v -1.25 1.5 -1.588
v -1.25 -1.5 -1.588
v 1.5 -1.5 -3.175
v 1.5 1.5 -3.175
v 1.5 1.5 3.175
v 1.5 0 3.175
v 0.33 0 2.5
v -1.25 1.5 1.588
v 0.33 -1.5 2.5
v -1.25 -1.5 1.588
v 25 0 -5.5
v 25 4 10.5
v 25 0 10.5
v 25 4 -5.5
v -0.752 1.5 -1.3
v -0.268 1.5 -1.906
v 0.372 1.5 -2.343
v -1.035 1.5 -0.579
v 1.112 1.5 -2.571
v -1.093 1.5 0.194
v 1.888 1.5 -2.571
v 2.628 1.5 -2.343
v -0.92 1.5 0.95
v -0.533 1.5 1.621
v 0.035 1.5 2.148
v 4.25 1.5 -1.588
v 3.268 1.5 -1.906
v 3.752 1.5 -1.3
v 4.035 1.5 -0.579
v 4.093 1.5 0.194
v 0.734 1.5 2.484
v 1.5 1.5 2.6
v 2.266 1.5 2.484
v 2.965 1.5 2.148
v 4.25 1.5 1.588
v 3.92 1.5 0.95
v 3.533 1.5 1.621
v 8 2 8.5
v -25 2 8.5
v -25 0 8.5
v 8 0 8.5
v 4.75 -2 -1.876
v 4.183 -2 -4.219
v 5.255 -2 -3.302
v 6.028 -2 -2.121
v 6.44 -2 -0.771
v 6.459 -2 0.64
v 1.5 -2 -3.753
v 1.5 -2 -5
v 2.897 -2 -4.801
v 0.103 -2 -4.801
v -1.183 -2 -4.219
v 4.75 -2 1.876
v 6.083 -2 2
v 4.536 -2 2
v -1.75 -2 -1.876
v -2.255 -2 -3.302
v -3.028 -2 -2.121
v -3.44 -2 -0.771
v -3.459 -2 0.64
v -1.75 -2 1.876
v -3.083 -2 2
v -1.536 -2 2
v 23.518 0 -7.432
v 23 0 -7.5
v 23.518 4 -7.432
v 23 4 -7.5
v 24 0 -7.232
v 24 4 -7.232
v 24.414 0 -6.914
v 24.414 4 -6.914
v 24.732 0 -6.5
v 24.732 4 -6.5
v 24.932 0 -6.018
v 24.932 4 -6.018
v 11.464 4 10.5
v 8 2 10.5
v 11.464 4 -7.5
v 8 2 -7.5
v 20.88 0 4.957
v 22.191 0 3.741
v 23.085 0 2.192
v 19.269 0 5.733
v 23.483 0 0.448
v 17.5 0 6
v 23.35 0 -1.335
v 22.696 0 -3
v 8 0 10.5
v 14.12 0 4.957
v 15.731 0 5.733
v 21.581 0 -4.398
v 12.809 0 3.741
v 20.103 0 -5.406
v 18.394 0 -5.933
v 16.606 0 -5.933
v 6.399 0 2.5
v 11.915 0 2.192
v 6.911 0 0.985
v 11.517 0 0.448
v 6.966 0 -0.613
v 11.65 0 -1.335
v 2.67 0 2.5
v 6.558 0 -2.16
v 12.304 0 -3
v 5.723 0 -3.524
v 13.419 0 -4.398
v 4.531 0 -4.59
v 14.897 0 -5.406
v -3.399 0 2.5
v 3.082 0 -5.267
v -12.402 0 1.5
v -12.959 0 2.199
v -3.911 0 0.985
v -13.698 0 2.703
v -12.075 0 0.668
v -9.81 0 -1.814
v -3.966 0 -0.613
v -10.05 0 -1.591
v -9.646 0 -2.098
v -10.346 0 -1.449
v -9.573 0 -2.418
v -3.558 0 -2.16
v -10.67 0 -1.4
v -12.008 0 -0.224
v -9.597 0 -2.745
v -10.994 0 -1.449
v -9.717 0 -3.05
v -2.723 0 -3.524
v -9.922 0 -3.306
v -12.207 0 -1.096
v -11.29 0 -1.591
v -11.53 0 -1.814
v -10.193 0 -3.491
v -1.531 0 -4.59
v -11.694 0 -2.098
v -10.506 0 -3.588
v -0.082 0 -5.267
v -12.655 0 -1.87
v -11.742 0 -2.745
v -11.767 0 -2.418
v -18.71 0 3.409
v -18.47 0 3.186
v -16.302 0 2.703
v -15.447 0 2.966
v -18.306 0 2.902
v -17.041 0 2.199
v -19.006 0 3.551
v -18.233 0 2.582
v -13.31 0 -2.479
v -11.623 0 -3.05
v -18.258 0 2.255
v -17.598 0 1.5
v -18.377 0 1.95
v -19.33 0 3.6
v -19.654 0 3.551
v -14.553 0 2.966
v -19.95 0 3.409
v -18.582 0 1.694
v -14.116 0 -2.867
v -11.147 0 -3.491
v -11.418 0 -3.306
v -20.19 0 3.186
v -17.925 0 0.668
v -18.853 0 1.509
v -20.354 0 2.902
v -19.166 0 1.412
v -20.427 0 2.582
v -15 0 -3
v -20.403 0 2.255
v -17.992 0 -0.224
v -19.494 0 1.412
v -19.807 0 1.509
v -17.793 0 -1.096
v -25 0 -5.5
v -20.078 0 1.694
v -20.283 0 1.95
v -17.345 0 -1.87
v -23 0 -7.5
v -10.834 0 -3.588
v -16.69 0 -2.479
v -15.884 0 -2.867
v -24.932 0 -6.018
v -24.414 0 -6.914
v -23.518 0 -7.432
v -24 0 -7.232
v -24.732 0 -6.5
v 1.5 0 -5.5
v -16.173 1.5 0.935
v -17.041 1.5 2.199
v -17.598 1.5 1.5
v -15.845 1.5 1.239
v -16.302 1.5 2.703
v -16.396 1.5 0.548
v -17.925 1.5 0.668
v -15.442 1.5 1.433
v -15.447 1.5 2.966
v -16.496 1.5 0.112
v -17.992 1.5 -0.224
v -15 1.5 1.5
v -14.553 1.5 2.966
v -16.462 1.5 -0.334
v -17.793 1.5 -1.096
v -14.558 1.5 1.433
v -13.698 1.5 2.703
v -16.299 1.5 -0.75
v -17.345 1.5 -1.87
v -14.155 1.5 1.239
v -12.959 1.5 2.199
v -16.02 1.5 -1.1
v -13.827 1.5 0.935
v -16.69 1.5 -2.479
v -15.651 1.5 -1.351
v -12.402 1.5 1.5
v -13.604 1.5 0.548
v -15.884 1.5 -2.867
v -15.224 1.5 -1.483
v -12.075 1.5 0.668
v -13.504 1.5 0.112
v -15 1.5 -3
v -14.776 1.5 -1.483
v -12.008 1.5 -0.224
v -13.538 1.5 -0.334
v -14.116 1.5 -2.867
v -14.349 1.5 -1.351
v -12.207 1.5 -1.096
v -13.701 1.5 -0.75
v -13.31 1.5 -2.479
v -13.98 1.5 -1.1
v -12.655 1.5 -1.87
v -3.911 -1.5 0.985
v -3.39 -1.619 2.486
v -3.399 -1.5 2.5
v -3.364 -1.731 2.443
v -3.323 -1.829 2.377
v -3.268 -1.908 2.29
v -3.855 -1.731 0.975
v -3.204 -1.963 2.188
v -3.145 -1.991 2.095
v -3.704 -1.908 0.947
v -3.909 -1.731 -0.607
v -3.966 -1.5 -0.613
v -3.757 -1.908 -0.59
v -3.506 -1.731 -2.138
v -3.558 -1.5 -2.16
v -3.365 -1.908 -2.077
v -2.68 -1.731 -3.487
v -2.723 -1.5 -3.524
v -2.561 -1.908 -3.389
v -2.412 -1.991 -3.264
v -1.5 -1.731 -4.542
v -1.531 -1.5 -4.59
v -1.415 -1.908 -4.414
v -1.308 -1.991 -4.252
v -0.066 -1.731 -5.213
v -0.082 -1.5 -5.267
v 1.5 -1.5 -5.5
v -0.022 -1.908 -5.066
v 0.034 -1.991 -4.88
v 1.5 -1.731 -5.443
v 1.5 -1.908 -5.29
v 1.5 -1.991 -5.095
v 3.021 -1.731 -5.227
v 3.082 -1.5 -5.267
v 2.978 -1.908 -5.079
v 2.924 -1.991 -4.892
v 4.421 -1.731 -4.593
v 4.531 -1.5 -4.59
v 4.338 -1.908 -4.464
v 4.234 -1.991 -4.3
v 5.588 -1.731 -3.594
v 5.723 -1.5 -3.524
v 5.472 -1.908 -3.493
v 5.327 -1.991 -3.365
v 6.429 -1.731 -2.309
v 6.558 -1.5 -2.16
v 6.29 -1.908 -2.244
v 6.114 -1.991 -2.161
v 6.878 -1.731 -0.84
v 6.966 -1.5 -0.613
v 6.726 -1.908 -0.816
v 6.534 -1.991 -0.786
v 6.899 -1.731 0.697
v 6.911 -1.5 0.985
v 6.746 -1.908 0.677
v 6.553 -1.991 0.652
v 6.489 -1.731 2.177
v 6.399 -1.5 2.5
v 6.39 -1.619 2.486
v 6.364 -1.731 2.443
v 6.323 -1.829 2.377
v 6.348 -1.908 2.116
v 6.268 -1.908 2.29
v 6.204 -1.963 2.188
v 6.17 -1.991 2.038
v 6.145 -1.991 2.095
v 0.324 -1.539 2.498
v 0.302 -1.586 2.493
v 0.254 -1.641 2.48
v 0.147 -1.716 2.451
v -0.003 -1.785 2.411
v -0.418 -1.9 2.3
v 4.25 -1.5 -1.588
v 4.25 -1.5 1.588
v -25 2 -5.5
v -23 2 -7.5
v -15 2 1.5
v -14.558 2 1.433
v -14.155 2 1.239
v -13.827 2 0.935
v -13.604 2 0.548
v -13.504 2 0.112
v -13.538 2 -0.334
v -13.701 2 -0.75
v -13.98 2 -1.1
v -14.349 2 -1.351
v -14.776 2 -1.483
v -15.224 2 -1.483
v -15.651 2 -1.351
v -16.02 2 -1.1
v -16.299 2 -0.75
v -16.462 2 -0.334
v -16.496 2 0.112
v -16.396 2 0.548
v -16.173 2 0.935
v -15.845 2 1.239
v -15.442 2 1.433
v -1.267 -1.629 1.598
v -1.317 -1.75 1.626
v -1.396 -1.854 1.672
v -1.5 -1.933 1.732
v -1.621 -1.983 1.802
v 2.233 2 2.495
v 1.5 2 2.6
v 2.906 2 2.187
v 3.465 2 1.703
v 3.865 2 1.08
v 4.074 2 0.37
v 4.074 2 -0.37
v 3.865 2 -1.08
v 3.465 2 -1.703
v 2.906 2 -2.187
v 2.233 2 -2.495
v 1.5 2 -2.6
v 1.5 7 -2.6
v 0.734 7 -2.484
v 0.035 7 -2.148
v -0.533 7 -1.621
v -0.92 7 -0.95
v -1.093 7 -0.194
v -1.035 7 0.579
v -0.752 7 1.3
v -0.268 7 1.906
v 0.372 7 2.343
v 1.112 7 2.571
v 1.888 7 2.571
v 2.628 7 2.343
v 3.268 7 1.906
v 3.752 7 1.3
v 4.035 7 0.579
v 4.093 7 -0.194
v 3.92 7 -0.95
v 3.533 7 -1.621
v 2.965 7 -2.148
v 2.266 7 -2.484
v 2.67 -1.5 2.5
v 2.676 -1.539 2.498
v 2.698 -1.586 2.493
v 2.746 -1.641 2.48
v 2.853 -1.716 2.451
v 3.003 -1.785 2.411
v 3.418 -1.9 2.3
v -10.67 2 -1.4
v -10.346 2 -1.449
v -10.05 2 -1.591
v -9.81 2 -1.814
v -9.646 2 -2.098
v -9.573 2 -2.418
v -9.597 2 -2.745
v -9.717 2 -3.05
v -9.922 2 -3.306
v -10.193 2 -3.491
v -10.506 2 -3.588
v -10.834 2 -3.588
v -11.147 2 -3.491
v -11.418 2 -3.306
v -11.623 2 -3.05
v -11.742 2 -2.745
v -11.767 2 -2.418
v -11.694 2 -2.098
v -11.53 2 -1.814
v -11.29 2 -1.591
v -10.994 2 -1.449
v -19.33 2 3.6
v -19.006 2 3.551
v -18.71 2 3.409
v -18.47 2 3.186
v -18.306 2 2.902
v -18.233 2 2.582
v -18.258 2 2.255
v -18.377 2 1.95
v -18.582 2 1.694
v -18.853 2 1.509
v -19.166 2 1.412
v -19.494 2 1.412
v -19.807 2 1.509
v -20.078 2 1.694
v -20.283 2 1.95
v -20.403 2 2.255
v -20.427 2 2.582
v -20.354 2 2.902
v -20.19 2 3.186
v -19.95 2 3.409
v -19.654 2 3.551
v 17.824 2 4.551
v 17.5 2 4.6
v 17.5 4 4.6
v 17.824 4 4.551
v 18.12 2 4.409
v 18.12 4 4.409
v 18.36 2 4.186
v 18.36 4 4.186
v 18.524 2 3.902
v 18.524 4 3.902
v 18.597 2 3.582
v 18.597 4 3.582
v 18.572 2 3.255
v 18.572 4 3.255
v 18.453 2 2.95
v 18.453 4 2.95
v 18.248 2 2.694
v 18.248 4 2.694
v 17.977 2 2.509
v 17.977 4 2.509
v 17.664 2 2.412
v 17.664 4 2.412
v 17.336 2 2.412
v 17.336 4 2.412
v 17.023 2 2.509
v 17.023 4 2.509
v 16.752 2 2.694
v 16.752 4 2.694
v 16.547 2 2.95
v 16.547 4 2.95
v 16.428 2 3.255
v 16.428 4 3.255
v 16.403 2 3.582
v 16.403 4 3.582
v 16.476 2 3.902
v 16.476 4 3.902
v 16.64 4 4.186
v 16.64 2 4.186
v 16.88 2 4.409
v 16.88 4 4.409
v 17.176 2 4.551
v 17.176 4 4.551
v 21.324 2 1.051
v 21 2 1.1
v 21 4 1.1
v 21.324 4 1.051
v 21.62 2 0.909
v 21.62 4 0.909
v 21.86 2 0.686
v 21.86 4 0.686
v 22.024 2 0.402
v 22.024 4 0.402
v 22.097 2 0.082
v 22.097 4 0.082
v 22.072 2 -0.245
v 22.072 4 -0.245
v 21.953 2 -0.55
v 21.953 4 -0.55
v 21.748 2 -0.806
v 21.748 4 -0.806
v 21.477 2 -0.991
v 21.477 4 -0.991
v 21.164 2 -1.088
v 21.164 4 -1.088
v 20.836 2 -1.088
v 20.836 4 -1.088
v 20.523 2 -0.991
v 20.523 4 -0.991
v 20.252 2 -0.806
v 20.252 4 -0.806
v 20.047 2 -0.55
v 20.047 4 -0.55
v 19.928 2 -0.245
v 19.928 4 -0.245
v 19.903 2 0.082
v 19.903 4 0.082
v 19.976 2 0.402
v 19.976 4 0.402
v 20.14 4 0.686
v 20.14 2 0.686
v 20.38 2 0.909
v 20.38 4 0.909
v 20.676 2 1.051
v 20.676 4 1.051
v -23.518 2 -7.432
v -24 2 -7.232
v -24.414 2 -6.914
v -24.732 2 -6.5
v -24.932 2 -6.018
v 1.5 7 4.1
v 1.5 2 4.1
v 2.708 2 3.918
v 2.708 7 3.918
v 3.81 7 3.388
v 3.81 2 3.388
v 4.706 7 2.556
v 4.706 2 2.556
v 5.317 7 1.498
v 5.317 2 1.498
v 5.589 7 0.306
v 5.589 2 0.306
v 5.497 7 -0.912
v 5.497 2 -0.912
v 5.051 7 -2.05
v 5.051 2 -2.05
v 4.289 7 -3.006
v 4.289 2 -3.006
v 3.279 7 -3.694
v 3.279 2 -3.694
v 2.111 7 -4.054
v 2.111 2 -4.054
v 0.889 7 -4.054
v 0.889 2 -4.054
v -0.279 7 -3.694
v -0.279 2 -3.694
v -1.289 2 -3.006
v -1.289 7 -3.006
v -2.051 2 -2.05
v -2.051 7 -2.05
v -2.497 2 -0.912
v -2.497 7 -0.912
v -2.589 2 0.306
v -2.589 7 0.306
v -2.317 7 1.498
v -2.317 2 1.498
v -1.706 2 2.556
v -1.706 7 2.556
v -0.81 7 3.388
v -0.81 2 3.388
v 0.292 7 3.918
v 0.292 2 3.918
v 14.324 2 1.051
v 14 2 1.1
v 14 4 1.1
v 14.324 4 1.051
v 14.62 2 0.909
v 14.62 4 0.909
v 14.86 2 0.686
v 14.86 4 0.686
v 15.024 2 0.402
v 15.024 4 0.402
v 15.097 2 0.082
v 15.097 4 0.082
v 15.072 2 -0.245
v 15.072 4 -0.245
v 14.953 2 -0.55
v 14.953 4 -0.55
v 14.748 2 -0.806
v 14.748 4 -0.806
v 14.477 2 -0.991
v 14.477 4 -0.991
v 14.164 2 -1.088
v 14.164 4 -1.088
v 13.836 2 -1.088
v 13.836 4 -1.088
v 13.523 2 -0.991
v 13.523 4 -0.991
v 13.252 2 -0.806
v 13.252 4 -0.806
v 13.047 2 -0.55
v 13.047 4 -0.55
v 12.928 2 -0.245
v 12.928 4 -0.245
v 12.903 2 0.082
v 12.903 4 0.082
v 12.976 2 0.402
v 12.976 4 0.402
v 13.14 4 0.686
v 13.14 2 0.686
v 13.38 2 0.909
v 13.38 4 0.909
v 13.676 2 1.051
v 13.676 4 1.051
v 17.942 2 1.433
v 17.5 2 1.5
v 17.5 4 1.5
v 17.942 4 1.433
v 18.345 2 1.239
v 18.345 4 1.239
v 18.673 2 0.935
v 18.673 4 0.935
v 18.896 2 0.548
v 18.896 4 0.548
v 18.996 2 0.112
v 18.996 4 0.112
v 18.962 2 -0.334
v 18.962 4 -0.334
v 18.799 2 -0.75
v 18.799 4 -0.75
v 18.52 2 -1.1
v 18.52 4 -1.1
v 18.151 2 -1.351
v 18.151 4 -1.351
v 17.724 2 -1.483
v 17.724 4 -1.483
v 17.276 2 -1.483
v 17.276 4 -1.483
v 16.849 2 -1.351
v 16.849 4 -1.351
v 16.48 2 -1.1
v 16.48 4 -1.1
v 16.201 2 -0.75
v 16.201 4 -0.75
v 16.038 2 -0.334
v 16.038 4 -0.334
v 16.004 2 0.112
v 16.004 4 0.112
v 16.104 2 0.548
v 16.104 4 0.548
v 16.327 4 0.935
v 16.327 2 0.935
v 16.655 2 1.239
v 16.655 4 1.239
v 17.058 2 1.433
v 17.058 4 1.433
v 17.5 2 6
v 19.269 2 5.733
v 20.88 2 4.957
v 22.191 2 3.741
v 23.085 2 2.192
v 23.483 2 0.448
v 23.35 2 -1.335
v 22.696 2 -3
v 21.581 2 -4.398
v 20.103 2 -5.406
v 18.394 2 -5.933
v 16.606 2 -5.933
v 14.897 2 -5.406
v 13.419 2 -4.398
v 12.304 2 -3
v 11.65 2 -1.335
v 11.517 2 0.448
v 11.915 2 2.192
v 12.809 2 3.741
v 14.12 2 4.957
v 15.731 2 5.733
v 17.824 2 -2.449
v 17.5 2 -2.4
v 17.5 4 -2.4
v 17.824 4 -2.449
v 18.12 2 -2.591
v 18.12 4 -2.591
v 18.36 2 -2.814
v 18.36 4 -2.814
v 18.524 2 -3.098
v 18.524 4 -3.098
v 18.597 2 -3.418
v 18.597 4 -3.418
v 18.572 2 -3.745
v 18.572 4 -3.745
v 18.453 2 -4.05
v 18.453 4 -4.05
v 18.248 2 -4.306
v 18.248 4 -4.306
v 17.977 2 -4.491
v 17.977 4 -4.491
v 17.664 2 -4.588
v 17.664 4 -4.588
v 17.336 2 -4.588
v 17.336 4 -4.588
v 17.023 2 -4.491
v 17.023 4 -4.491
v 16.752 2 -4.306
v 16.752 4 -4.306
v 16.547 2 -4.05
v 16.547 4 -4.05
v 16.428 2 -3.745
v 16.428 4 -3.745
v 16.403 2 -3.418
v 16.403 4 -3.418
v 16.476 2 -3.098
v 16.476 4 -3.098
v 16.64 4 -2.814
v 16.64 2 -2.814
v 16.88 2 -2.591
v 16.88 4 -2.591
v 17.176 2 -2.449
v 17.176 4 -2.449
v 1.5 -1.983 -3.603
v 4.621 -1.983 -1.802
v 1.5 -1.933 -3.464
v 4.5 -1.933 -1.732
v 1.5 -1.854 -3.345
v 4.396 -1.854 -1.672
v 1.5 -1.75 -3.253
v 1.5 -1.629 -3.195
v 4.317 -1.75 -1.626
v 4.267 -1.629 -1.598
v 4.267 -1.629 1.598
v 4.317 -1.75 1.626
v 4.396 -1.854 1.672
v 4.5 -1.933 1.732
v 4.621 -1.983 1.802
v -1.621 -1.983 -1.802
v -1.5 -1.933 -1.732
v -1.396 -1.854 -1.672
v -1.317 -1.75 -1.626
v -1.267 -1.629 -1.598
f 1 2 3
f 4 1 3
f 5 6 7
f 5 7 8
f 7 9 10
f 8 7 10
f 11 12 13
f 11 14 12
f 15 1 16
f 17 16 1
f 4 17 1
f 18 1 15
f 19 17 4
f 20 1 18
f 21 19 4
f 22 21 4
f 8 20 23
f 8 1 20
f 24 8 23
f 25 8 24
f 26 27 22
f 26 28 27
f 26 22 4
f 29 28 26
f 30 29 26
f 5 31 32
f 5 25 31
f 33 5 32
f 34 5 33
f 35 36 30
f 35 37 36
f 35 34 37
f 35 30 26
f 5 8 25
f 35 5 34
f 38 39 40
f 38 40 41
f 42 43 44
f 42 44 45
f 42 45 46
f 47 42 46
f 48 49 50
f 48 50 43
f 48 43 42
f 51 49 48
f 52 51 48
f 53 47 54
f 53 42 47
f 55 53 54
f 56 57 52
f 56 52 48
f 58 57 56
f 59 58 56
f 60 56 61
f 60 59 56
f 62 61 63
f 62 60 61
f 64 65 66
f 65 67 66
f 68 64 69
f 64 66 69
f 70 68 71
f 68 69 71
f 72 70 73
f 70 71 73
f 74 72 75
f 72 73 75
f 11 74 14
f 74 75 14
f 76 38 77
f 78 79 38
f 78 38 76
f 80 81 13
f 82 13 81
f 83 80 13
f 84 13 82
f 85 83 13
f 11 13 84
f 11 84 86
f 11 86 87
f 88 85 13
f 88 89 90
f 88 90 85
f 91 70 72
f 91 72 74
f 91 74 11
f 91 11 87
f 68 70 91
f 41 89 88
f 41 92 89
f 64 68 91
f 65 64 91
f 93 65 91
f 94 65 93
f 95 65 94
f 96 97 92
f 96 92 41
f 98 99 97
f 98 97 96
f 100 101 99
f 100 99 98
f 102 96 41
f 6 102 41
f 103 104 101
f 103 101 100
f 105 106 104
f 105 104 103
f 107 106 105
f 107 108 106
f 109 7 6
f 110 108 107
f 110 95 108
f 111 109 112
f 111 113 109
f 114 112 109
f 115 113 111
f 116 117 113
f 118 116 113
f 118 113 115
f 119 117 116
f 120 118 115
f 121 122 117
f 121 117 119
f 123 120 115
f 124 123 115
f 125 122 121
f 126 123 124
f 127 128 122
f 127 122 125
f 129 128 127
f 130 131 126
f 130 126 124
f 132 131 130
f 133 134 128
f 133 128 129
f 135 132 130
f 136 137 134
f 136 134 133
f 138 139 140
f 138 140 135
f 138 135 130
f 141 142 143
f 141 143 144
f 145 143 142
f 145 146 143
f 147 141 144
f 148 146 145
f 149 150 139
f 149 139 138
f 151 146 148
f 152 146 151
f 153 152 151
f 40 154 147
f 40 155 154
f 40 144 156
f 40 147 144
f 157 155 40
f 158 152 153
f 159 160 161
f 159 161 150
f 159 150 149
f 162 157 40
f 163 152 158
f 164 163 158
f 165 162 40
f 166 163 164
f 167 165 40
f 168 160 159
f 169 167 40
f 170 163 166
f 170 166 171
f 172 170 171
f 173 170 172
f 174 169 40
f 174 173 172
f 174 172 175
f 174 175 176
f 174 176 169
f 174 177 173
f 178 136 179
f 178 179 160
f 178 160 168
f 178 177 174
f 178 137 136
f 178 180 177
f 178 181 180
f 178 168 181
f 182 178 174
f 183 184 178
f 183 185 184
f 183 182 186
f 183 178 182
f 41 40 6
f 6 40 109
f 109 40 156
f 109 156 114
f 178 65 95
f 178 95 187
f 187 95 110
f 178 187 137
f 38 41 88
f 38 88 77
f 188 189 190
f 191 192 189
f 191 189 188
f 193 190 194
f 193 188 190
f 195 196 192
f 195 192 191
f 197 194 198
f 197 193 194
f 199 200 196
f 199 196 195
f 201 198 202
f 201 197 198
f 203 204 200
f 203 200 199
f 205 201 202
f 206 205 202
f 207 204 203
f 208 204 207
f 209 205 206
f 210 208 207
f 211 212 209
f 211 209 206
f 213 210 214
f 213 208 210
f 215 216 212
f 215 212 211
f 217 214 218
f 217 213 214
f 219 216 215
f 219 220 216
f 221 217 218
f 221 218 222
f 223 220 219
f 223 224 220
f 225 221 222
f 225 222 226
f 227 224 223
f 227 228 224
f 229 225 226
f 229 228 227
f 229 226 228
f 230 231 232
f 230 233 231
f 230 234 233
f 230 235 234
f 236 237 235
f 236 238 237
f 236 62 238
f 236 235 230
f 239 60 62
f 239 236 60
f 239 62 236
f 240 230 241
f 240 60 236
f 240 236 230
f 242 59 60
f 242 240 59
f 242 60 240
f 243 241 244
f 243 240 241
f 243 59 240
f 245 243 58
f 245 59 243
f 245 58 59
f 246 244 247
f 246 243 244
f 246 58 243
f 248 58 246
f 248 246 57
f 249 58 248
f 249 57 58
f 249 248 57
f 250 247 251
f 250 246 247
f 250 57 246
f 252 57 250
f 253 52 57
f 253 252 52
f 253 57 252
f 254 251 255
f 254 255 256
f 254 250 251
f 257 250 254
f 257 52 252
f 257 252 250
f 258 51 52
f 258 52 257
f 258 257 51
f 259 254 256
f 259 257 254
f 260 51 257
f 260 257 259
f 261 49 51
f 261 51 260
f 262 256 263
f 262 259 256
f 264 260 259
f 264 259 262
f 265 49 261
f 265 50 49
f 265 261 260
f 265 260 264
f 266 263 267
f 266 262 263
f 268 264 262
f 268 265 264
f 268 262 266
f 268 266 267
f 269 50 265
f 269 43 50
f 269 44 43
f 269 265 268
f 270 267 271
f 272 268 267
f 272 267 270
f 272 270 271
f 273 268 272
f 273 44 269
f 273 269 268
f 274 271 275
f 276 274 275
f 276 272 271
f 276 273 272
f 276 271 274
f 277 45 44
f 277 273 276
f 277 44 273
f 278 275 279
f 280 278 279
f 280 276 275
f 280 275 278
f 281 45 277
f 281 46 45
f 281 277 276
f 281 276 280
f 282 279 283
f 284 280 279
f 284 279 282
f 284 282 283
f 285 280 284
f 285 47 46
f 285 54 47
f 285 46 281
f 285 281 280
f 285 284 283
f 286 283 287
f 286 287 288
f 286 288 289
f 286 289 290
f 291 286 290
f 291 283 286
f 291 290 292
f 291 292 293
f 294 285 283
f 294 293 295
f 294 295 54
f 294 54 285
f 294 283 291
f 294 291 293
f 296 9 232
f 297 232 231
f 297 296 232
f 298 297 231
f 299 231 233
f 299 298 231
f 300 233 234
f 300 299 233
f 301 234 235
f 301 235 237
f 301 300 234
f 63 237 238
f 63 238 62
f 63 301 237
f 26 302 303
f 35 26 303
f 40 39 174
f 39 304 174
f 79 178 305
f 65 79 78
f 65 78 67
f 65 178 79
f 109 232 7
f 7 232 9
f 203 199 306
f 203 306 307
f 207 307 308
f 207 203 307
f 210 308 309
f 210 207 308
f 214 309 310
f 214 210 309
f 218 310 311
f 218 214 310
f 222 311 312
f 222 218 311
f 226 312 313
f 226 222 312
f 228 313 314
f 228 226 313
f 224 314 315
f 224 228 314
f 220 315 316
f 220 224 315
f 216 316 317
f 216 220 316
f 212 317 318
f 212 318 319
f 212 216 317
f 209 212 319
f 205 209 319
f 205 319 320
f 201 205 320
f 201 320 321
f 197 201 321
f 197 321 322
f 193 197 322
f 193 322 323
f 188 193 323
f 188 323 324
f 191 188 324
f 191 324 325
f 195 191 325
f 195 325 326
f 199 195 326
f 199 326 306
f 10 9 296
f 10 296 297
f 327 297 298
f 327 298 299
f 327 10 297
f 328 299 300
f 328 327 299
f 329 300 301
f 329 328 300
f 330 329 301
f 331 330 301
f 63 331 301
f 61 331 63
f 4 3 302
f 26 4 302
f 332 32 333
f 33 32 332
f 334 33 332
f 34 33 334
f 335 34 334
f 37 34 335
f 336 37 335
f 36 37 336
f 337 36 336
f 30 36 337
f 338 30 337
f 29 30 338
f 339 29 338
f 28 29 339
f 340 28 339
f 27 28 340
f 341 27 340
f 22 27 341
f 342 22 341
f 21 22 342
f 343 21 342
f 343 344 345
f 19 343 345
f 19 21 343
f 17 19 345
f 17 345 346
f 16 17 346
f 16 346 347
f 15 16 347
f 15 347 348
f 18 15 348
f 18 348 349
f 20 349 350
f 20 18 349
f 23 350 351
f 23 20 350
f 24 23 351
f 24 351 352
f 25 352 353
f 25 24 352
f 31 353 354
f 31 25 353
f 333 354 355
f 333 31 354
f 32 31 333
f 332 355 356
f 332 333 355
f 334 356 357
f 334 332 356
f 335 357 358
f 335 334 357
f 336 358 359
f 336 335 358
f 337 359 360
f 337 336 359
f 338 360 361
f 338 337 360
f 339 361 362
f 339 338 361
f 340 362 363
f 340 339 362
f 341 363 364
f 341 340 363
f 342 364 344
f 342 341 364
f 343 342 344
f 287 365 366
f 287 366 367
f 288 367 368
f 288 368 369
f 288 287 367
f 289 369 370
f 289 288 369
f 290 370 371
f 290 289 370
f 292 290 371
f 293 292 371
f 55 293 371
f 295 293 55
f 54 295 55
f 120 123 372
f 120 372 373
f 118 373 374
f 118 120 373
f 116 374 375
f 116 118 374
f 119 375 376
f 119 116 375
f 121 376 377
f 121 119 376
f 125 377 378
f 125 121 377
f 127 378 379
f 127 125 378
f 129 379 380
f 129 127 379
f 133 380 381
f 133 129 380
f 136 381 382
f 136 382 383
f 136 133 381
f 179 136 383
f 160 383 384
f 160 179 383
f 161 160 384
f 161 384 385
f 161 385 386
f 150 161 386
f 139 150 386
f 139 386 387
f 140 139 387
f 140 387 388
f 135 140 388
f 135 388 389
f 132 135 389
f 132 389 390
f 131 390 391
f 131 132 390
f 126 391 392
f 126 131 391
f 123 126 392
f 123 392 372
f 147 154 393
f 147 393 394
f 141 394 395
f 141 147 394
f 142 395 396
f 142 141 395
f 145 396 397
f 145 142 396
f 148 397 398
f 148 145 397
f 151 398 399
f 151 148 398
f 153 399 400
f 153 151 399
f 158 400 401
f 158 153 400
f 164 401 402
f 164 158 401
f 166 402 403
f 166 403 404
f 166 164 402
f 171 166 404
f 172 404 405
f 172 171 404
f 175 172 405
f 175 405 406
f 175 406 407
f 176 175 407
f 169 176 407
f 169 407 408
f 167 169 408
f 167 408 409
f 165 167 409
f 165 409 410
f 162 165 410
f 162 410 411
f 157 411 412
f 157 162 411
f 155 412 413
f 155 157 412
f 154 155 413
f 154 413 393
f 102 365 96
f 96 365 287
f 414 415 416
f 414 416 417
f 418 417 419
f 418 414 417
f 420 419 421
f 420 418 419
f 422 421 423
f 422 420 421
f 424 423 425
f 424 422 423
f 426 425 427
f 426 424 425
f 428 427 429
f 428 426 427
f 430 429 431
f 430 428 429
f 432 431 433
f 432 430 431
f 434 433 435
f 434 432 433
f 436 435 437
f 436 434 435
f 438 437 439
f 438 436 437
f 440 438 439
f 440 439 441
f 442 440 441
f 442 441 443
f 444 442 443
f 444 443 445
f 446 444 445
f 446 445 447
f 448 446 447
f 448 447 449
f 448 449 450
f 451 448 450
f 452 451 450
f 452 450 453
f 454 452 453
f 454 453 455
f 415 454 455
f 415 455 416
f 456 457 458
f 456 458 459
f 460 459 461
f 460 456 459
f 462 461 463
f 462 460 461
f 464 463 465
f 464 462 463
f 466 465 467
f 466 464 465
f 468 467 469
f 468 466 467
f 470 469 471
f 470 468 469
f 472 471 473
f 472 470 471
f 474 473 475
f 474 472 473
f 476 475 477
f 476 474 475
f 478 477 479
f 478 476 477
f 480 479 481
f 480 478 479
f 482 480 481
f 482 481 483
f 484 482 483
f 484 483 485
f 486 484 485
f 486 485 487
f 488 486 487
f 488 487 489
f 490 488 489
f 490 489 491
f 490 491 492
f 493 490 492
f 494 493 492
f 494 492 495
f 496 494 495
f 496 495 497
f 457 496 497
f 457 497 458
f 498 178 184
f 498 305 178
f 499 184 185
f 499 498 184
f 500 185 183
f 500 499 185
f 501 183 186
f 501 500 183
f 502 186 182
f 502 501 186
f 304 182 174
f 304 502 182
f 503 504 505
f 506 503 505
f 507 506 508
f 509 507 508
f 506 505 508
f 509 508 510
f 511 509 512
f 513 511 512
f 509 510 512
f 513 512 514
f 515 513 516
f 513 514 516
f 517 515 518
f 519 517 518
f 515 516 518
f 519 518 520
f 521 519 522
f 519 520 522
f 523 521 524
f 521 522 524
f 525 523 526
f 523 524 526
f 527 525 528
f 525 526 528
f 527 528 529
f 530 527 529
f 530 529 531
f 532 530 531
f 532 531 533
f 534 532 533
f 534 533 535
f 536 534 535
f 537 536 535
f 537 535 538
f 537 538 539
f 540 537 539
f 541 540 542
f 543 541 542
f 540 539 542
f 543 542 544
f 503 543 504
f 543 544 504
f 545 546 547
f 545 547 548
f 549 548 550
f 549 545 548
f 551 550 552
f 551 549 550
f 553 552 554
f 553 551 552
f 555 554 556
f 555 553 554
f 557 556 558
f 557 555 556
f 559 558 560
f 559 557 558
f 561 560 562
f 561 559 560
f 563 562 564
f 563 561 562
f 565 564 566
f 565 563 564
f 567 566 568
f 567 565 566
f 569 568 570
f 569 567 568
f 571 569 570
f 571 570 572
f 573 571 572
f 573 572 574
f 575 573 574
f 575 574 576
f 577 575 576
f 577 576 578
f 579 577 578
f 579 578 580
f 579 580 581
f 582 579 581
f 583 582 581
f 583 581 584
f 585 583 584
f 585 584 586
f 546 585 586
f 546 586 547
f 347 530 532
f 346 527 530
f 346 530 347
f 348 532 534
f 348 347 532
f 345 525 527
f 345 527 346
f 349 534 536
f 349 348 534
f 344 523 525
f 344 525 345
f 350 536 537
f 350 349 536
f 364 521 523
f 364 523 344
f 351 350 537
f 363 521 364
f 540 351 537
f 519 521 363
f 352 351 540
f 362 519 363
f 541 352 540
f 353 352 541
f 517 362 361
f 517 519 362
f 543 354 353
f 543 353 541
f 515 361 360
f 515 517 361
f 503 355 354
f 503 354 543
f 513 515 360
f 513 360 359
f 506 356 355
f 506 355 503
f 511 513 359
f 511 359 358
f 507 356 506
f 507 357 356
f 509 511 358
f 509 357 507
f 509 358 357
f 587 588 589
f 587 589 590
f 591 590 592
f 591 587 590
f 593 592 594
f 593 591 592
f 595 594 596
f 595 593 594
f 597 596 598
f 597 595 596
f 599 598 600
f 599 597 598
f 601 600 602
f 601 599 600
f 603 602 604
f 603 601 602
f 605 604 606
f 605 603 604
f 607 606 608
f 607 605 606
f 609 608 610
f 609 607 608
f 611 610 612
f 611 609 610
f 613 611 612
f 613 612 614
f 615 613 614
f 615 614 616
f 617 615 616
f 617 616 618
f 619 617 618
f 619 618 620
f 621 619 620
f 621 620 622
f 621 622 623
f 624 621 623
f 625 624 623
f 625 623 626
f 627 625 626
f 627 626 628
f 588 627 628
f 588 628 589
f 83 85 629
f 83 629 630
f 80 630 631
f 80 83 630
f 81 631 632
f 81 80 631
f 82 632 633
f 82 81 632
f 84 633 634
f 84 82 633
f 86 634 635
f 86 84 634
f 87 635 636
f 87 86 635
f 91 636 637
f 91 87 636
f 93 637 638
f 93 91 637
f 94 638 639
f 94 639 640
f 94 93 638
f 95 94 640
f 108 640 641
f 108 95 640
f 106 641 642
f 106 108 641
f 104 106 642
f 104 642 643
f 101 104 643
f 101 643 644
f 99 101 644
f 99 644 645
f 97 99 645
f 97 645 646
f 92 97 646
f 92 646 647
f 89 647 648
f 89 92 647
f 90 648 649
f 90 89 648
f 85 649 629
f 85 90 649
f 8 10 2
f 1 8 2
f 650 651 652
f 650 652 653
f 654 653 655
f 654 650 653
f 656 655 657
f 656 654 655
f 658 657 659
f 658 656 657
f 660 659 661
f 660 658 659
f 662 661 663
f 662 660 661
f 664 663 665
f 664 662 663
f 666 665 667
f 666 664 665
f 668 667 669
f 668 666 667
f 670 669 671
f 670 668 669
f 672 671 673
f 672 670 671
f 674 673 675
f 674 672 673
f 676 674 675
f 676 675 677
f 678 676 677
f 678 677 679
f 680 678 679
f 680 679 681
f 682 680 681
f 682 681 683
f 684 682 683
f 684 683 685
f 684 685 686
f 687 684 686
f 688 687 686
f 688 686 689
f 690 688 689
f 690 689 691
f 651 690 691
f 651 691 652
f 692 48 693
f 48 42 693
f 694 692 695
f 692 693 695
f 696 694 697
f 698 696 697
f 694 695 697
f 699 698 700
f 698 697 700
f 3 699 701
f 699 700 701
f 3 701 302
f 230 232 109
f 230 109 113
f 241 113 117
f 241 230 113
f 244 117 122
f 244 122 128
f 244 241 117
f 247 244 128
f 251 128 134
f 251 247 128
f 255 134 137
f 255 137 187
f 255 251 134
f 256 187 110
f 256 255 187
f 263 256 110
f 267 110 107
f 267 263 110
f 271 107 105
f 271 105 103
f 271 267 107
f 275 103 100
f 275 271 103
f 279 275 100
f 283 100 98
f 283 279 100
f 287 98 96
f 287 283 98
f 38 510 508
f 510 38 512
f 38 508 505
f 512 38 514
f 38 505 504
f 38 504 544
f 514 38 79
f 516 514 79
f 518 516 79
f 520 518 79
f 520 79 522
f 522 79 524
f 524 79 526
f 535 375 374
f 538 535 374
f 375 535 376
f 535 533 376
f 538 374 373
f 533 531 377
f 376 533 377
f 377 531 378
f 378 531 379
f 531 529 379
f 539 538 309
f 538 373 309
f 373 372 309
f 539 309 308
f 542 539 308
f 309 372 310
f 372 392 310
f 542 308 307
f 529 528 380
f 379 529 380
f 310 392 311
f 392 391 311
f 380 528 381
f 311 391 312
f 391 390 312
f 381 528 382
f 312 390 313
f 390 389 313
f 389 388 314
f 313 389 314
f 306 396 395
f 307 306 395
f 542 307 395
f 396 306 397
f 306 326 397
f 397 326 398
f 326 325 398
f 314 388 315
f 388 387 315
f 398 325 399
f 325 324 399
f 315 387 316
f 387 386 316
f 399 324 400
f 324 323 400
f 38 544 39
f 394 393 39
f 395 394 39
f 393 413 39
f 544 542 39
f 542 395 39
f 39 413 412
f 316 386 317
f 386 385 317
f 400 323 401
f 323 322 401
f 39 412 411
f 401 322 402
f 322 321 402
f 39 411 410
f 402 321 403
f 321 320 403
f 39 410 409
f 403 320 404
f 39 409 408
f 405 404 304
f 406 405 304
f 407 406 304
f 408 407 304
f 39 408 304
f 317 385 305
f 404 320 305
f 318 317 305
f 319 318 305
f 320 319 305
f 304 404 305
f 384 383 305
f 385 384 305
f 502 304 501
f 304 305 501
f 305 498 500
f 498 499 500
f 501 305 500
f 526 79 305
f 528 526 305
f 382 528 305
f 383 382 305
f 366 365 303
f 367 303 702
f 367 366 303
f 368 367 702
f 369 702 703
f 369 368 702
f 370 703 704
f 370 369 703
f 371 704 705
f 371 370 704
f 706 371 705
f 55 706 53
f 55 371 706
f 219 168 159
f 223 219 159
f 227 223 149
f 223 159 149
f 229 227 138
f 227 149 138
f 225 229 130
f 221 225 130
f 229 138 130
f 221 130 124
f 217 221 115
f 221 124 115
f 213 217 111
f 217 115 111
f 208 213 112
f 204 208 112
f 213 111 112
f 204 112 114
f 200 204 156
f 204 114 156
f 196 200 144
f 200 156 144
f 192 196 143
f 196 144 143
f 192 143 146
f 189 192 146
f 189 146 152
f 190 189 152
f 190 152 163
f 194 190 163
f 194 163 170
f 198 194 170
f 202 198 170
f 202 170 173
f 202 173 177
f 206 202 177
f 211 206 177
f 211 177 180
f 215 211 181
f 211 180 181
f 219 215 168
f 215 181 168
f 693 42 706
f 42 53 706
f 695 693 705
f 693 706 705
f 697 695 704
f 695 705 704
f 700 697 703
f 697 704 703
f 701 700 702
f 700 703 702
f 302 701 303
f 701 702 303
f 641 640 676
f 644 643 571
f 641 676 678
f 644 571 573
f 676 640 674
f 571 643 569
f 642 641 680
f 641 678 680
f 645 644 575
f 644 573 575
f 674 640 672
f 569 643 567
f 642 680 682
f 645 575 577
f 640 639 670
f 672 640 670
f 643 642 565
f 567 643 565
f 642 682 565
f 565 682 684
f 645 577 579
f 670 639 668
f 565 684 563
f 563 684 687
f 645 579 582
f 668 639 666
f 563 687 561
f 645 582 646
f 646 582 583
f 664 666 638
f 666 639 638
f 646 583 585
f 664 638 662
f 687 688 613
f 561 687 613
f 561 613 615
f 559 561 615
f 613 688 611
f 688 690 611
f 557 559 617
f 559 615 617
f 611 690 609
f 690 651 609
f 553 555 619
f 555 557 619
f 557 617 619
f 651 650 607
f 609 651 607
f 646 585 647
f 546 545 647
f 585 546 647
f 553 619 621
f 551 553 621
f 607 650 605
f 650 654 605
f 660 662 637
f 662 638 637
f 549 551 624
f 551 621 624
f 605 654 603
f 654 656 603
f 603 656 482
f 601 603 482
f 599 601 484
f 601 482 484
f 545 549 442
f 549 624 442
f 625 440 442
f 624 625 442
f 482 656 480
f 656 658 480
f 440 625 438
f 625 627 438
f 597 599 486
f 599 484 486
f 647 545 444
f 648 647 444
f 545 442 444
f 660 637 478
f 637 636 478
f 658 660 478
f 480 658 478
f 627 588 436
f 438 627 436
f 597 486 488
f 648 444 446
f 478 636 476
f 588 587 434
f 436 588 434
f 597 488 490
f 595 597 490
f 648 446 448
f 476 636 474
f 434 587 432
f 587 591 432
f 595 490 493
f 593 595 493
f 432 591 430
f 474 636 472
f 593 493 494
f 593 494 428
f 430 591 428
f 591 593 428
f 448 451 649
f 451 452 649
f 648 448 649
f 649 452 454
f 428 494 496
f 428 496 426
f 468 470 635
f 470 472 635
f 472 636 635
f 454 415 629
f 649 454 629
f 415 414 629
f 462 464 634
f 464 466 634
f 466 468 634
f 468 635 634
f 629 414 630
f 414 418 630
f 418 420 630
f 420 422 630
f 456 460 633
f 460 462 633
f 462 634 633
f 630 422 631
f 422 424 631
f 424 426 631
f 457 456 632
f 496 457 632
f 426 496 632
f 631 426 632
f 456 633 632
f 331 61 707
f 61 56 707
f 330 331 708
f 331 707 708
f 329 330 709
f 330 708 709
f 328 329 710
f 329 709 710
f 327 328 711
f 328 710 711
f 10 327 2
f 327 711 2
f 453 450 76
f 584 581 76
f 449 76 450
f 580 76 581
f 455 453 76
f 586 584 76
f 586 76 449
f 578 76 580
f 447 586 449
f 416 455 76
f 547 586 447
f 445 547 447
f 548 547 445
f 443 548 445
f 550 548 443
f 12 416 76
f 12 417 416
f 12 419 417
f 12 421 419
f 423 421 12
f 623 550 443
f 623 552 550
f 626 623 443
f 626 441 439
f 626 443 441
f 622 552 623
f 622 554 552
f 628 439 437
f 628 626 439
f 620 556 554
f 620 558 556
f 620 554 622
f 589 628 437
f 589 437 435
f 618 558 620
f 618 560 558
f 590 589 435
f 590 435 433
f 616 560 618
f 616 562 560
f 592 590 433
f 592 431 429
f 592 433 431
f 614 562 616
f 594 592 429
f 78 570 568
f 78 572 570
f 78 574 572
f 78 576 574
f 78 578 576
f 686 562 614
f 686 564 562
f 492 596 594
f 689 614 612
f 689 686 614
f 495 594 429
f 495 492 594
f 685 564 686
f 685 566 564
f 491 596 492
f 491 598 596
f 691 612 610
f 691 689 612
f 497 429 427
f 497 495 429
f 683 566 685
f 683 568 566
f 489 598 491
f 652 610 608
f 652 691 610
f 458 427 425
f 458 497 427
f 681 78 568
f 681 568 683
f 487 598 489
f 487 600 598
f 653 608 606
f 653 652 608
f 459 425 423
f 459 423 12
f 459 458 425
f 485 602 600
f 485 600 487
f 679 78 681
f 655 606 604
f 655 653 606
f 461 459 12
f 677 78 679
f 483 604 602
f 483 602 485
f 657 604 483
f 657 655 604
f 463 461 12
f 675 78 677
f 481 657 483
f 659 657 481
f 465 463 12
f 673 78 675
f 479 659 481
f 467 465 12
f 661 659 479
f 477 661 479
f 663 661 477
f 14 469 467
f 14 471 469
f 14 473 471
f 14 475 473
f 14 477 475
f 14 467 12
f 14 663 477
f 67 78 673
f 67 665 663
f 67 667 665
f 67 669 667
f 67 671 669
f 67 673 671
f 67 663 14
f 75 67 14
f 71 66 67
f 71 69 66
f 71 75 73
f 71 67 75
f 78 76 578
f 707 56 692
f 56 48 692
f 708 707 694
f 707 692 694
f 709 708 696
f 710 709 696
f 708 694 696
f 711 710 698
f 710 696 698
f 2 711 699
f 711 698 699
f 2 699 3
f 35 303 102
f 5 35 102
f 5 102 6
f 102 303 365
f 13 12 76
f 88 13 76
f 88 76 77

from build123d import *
from build123d.topology import SkipClean

# Parameters (mm, degrees)
SKETCH_1_W          = 50
SKETCH_1_H          = 15
SKETCH_1_R          = 1.1
SKETCH_1_R_2        = 1.5
SKETCH_1_R_3        = 2.6
EXTRUDE_1_DEPTH     = 2
SKETCH_3_R          = 3
CUT_EXTRUDE_1_DEPTH = 1.5
SKETCH_1_7_W        = 17
SKETCH_1_7_H        = 15
SKETCH_1_7_R        = 1.5
SKETCH_1_7_R_2      = 1.1
EXTRUDE_4_DEPTH     = 4
SKETCH_1_8_R        = 6
SKETCH_1_8_R_2      = 1.5
SKETCH_1_8_R_3      = 1.1
CUT_EXTRUDE_4_DEPTH = 2
CUT_EXTRUDE_5_DEPTH = 15
EXTRUDE_START       = 2
SKETCH_8_R          = 5.5
SKETCH_8_R_2        = 2.6
EXTRUDE_11_DEPTH    = 2
CUT_EXTRUDE_6_DEPTH = 3.5
CUT_EXTRUDE_7_DEPTH = 2
FILLET_1_R          = 2
EXTRUDE_15_DEPTH    = 1
EXTRUDE_16_DEPTH    = 2
SKETCH_16_R         = 4.1
SKETCH_16_R_2       = 2.6
EXTRUDE_18_DEPTH    = 5
FILLET_3_R          = 0.5


with BuildPart() as part:
    # 草图1 → 凸台-拉伸1 (new body)
    with BuildSketch(Plane(origin=(0, 0, 0), x_dir=(1, 0, 0), z_dir=(0, 1, 0))):
        Rectangle(SKETCH_1_W, SKETCH_1_H)
        with BuildLine():
            ThreePointArc((8, 2.598076211), (8.5, 0), (8, -2.598076211))
            Line((8, -2.598076211), (8, 2.598076211))
        make_face(mode=Mode.SUBTRACT)
        with Locations(Location((-19.330127019, -2.5, 0), (0, 0, 270))):
            Circle(SKETCH_1_R, mode=Mode.SUBTRACT)
        with Locations(Location((-15, 0, 0), (0, 0, 270))):
            Circle(SKETCH_1_R_2, mode=Mode.SUBTRACT)
        with Locations(Location((-10.669872981, 2.5, 0), (0, 0, 270))):
            Circle(SKETCH_1_R, mode=Mode.SUBTRACT)
        with Locations(Location((1.5, 0, 0), (0, 0, 270))):
            Circle(SKETCH_1_R_3, mode=Mode.SUBTRACT)
        with Locations(Location((17.5, 3.5, 0), (0, 0, 270))):
            Circle(SKETCH_1_R, mode=Mode.SUBTRACT)
        with Locations(Location((17.5, -3.5, 0), (0, 0, 270))):
            Circle(SKETCH_1_R, mode=Mode.SUBTRACT)
        with Locations(Location((14, 0, 0), (0, 0, 270))):
            Circle(SKETCH_1_R, mode=Mode.SUBTRACT)
        with Locations(Location((17.5, 0, 0), (0, 0, 270))):
            Circle(SKETCH_1_R_2, mode=Mode.SUBTRACT)
        with Locations(Location((21, 0, 0), (0, 0, 270))):
            Circle(SKETCH_1_R, mode=Mode.SUBTRACT)
    extrude(amount=EXTRUDE_1_DEPTH)

    # 草图3 → 切除-拉伸1 (cut)
    with BuildSketch(Plane.XZ):
        with Locations(Location((-15, 0, 0), (0, 0, 270))):
            Circle(SKETCH_3_R)
    extrude(amount=-CUT_EXTRUDE_1_DEPTH, mode=Mode.SUBTRACT)

    # 草图1<7> → 凸台-拉伸4 (add)
    with BuildSketch(Plane(origin=(0, 0, 0), x_dir=(1, 0, 0), z_dir=(0, 1, 0))):
        with Locations((16.5, 0)):
            Rectangle(SKETCH_1_7_W, SKETCH_1_7_H)
        with Locations(Location((17.5, 0, 0), (0, 0, 270))):
            Circle(SKETCH_1_7_R, mode=Mode.SUBTRACT)
        with Locations(Location((21, 0, 0), (0, 0, 270))):
            Circle(SKETCH_1_7_R_2, mode=Mode.SUBTRACT)
        with Locations(Location((17.5, -3.5, 0), (0, 0, 270))):
            Circle(SKETCH_1_7_R_2, mode=Mode.SUBTRACT)
        with Locations(Location((14, 0, 0), (0, 0, 270))):
            Circle(SKETCH_1_7_R_2, mode=Mode.SUBTRACT)
        with Locations(Location((17.5, 3.5, 0), (0, 0, 270))):
            Circle(SKETCH_1_7_R_2, mode=Mode.SUBTRACT)
    extrude(amount=EXTRUDE_4_DEPTH)

    # 草图1<8> → 切除-拉伸4 (cut)
    with BuildSketch(Plane(origin=(0, 0, 0), x_dir=(1, 0, 0), z_dir=(0, 1, 0))):
        with Locations(Location((17.5, 0, 0), (0, 0, 270))):
            Circle(SKETCH_1_8_R)
        with Locations(Location((17.5, 0, 0), (0, 0, 270))):
            Circle(SKETCH_1_8_R_2, mode=Mode.SUBTRACT)
        with Locations(Location((21, 0, 0), (0, 0, 270))):
            Circle(SKETCH_1_8_R_3, mode=Mode.SUBTRACT)
        with Locations(Location((17.5, -3.5, 0), (0, 0, 270))):
            Circle(SKETCH_1_8_R_3, mode=Mode.SUBTRACT)
        with Locations(Location((14, 0, 0), (0, 0, 270))):
            Circle(SKETCH_1_8_R_3, mode=Mode.SUBTRACT)
        with Locations(Location((17.5, 3.5, 0), (0, 0, 270))):
            Circle(SKETCH_1_8_R_3, mode=Mode.SUBTRACT)
    extrude(amount=CUT_EXTRUDE_4_DEPTH, mode=Mode.SUBTRACT)

    # 草图6 → 切除-拉伸5 (cut)
    with BuildSketch(Plane(origin=(0, 0, -7.5), x_dir=(-1, 0, 0), z_dir=(0, 0, -1))):
        Polygon((-8, 2), (-11.464101615, 4), (-8, 4), align=None)
    extrude(amount=-CUT_EXTRUDE_5_DEPTH, mode=Mode.SUBTRACT)

    # 草图8 → 凸台-拉伸11 (add)
    with SkipClean():  # the faces are left unmerged after this step: merging them gives an invalid solid
        with BuildSketch(Plane.XZ.offset(EXTRUDE_START)):
            with Locations(Location((1.5, 0, 0), (0, 0, 90))):
                Circle(SKETCH_8_R)
            with Locations(Location((1.5, 0, 0), (0, 0, 270))):
                Circle(SKETCH_8_R_2, mode=Mode.SUBTRACT)
        extrude(amount=-EXTRUDE_11_DEPTH)

    # 草图10 → 切除-拉伸6 (cut)
    with BuildSketch(Plane.XZ.offset(2)):
        Polygon((1.5, 3.175426481), (-1.25, 1.58771324), (-1.25, -1.58771324), (1.5, -3.175426481), (4.25, -1.58771324), (4.25, 1.58771324), align=None)
    extrude(amount=-CUT_EXTRUDE_6_DEPTH, mode=Mode.SUBTRACT)

    # 草图11 → 切除-拉伸7 (cut)
    with BuildSketch(Plane.XZ.offset(2)):
        with BuildLine():
            Line((-3.398979486, 2.5), (6.398979486, 2.5))
            ThreePointArc((6.398979486, 2.5), (1.5, 5.5), (-3.398979486, 2.5))
        make_face()
    extrude(amount=-CUT_EXTRUDE_7_DEPTH, mode=Mode.SUBTRACT)

    # 圆角1
    fillet_1_edges = [part.edges().sort_by_distance(p)[0] for p in [
        (-25, 1, -7.5),
        (25, 2, -7.5),
    ]]
    fillet(fillet_1_edges, radius=FILLET_1_R)

    # 草图13 → 凸台-拉伸15 (add)
    with BuildSketch(Plane.XY.offset(7.5)):
        Polygon((11.464101615, 4), (8, 2), (-25, 2), (-25, 0), (25, 0), (25, 4), align=None)
    extrude(amount=EXTRUDE_15_DEPTH)

    # 草图14 → 凸台-拉伸16 (add)
    with BuildSketch(Plane.XY.offset(8.5)):
        Polygon((8, 0), (8, 2), (11.464101615, 4), (25, 4), (25, 0), align=None)
    extrude(amount=EXTRUDE_16_DEPTH)

    # 草图16 → 凸台-拉伸18 (add)
    with BuildSketch(Plane(origin=(0, 2, 0), x_dir=(1, 0, 0), z_dir=(0, 1, 0))):
        with Locations(Location((1.5, 0, 0), (0, 0, 270))):
            Circle(SKETCH_16_R)
        with Locations(Location((1.5, 0, 0), (0, 0, 90))):
            Circle(SKETCH_16_R_2, mode=Mode.SUBTRACT)
    extrude(amount=EXTRUDE_18_DEPTH)

    # 圆角3
    fillet_3_edges = [part.edges().sort_by_distance(p)[0] for p in [
        (4.25, -2, 0),
        (3.459936491, -2, 2.04385662),
        (-1.25, -2, 0),
        (0.125, -2, -2.38156986),
        (2.875, -2, -2.38156986),
        (-0.459936491, -2, 2.04385662),
        (1.5, -2, -5.5),
        (4.534426233, -2, 2.5),
        (-1.534426233, -2, 2.5),
    ]]
    fillet(fillet_3_edges, radius=FILLET_3_R)


solid = part.part
